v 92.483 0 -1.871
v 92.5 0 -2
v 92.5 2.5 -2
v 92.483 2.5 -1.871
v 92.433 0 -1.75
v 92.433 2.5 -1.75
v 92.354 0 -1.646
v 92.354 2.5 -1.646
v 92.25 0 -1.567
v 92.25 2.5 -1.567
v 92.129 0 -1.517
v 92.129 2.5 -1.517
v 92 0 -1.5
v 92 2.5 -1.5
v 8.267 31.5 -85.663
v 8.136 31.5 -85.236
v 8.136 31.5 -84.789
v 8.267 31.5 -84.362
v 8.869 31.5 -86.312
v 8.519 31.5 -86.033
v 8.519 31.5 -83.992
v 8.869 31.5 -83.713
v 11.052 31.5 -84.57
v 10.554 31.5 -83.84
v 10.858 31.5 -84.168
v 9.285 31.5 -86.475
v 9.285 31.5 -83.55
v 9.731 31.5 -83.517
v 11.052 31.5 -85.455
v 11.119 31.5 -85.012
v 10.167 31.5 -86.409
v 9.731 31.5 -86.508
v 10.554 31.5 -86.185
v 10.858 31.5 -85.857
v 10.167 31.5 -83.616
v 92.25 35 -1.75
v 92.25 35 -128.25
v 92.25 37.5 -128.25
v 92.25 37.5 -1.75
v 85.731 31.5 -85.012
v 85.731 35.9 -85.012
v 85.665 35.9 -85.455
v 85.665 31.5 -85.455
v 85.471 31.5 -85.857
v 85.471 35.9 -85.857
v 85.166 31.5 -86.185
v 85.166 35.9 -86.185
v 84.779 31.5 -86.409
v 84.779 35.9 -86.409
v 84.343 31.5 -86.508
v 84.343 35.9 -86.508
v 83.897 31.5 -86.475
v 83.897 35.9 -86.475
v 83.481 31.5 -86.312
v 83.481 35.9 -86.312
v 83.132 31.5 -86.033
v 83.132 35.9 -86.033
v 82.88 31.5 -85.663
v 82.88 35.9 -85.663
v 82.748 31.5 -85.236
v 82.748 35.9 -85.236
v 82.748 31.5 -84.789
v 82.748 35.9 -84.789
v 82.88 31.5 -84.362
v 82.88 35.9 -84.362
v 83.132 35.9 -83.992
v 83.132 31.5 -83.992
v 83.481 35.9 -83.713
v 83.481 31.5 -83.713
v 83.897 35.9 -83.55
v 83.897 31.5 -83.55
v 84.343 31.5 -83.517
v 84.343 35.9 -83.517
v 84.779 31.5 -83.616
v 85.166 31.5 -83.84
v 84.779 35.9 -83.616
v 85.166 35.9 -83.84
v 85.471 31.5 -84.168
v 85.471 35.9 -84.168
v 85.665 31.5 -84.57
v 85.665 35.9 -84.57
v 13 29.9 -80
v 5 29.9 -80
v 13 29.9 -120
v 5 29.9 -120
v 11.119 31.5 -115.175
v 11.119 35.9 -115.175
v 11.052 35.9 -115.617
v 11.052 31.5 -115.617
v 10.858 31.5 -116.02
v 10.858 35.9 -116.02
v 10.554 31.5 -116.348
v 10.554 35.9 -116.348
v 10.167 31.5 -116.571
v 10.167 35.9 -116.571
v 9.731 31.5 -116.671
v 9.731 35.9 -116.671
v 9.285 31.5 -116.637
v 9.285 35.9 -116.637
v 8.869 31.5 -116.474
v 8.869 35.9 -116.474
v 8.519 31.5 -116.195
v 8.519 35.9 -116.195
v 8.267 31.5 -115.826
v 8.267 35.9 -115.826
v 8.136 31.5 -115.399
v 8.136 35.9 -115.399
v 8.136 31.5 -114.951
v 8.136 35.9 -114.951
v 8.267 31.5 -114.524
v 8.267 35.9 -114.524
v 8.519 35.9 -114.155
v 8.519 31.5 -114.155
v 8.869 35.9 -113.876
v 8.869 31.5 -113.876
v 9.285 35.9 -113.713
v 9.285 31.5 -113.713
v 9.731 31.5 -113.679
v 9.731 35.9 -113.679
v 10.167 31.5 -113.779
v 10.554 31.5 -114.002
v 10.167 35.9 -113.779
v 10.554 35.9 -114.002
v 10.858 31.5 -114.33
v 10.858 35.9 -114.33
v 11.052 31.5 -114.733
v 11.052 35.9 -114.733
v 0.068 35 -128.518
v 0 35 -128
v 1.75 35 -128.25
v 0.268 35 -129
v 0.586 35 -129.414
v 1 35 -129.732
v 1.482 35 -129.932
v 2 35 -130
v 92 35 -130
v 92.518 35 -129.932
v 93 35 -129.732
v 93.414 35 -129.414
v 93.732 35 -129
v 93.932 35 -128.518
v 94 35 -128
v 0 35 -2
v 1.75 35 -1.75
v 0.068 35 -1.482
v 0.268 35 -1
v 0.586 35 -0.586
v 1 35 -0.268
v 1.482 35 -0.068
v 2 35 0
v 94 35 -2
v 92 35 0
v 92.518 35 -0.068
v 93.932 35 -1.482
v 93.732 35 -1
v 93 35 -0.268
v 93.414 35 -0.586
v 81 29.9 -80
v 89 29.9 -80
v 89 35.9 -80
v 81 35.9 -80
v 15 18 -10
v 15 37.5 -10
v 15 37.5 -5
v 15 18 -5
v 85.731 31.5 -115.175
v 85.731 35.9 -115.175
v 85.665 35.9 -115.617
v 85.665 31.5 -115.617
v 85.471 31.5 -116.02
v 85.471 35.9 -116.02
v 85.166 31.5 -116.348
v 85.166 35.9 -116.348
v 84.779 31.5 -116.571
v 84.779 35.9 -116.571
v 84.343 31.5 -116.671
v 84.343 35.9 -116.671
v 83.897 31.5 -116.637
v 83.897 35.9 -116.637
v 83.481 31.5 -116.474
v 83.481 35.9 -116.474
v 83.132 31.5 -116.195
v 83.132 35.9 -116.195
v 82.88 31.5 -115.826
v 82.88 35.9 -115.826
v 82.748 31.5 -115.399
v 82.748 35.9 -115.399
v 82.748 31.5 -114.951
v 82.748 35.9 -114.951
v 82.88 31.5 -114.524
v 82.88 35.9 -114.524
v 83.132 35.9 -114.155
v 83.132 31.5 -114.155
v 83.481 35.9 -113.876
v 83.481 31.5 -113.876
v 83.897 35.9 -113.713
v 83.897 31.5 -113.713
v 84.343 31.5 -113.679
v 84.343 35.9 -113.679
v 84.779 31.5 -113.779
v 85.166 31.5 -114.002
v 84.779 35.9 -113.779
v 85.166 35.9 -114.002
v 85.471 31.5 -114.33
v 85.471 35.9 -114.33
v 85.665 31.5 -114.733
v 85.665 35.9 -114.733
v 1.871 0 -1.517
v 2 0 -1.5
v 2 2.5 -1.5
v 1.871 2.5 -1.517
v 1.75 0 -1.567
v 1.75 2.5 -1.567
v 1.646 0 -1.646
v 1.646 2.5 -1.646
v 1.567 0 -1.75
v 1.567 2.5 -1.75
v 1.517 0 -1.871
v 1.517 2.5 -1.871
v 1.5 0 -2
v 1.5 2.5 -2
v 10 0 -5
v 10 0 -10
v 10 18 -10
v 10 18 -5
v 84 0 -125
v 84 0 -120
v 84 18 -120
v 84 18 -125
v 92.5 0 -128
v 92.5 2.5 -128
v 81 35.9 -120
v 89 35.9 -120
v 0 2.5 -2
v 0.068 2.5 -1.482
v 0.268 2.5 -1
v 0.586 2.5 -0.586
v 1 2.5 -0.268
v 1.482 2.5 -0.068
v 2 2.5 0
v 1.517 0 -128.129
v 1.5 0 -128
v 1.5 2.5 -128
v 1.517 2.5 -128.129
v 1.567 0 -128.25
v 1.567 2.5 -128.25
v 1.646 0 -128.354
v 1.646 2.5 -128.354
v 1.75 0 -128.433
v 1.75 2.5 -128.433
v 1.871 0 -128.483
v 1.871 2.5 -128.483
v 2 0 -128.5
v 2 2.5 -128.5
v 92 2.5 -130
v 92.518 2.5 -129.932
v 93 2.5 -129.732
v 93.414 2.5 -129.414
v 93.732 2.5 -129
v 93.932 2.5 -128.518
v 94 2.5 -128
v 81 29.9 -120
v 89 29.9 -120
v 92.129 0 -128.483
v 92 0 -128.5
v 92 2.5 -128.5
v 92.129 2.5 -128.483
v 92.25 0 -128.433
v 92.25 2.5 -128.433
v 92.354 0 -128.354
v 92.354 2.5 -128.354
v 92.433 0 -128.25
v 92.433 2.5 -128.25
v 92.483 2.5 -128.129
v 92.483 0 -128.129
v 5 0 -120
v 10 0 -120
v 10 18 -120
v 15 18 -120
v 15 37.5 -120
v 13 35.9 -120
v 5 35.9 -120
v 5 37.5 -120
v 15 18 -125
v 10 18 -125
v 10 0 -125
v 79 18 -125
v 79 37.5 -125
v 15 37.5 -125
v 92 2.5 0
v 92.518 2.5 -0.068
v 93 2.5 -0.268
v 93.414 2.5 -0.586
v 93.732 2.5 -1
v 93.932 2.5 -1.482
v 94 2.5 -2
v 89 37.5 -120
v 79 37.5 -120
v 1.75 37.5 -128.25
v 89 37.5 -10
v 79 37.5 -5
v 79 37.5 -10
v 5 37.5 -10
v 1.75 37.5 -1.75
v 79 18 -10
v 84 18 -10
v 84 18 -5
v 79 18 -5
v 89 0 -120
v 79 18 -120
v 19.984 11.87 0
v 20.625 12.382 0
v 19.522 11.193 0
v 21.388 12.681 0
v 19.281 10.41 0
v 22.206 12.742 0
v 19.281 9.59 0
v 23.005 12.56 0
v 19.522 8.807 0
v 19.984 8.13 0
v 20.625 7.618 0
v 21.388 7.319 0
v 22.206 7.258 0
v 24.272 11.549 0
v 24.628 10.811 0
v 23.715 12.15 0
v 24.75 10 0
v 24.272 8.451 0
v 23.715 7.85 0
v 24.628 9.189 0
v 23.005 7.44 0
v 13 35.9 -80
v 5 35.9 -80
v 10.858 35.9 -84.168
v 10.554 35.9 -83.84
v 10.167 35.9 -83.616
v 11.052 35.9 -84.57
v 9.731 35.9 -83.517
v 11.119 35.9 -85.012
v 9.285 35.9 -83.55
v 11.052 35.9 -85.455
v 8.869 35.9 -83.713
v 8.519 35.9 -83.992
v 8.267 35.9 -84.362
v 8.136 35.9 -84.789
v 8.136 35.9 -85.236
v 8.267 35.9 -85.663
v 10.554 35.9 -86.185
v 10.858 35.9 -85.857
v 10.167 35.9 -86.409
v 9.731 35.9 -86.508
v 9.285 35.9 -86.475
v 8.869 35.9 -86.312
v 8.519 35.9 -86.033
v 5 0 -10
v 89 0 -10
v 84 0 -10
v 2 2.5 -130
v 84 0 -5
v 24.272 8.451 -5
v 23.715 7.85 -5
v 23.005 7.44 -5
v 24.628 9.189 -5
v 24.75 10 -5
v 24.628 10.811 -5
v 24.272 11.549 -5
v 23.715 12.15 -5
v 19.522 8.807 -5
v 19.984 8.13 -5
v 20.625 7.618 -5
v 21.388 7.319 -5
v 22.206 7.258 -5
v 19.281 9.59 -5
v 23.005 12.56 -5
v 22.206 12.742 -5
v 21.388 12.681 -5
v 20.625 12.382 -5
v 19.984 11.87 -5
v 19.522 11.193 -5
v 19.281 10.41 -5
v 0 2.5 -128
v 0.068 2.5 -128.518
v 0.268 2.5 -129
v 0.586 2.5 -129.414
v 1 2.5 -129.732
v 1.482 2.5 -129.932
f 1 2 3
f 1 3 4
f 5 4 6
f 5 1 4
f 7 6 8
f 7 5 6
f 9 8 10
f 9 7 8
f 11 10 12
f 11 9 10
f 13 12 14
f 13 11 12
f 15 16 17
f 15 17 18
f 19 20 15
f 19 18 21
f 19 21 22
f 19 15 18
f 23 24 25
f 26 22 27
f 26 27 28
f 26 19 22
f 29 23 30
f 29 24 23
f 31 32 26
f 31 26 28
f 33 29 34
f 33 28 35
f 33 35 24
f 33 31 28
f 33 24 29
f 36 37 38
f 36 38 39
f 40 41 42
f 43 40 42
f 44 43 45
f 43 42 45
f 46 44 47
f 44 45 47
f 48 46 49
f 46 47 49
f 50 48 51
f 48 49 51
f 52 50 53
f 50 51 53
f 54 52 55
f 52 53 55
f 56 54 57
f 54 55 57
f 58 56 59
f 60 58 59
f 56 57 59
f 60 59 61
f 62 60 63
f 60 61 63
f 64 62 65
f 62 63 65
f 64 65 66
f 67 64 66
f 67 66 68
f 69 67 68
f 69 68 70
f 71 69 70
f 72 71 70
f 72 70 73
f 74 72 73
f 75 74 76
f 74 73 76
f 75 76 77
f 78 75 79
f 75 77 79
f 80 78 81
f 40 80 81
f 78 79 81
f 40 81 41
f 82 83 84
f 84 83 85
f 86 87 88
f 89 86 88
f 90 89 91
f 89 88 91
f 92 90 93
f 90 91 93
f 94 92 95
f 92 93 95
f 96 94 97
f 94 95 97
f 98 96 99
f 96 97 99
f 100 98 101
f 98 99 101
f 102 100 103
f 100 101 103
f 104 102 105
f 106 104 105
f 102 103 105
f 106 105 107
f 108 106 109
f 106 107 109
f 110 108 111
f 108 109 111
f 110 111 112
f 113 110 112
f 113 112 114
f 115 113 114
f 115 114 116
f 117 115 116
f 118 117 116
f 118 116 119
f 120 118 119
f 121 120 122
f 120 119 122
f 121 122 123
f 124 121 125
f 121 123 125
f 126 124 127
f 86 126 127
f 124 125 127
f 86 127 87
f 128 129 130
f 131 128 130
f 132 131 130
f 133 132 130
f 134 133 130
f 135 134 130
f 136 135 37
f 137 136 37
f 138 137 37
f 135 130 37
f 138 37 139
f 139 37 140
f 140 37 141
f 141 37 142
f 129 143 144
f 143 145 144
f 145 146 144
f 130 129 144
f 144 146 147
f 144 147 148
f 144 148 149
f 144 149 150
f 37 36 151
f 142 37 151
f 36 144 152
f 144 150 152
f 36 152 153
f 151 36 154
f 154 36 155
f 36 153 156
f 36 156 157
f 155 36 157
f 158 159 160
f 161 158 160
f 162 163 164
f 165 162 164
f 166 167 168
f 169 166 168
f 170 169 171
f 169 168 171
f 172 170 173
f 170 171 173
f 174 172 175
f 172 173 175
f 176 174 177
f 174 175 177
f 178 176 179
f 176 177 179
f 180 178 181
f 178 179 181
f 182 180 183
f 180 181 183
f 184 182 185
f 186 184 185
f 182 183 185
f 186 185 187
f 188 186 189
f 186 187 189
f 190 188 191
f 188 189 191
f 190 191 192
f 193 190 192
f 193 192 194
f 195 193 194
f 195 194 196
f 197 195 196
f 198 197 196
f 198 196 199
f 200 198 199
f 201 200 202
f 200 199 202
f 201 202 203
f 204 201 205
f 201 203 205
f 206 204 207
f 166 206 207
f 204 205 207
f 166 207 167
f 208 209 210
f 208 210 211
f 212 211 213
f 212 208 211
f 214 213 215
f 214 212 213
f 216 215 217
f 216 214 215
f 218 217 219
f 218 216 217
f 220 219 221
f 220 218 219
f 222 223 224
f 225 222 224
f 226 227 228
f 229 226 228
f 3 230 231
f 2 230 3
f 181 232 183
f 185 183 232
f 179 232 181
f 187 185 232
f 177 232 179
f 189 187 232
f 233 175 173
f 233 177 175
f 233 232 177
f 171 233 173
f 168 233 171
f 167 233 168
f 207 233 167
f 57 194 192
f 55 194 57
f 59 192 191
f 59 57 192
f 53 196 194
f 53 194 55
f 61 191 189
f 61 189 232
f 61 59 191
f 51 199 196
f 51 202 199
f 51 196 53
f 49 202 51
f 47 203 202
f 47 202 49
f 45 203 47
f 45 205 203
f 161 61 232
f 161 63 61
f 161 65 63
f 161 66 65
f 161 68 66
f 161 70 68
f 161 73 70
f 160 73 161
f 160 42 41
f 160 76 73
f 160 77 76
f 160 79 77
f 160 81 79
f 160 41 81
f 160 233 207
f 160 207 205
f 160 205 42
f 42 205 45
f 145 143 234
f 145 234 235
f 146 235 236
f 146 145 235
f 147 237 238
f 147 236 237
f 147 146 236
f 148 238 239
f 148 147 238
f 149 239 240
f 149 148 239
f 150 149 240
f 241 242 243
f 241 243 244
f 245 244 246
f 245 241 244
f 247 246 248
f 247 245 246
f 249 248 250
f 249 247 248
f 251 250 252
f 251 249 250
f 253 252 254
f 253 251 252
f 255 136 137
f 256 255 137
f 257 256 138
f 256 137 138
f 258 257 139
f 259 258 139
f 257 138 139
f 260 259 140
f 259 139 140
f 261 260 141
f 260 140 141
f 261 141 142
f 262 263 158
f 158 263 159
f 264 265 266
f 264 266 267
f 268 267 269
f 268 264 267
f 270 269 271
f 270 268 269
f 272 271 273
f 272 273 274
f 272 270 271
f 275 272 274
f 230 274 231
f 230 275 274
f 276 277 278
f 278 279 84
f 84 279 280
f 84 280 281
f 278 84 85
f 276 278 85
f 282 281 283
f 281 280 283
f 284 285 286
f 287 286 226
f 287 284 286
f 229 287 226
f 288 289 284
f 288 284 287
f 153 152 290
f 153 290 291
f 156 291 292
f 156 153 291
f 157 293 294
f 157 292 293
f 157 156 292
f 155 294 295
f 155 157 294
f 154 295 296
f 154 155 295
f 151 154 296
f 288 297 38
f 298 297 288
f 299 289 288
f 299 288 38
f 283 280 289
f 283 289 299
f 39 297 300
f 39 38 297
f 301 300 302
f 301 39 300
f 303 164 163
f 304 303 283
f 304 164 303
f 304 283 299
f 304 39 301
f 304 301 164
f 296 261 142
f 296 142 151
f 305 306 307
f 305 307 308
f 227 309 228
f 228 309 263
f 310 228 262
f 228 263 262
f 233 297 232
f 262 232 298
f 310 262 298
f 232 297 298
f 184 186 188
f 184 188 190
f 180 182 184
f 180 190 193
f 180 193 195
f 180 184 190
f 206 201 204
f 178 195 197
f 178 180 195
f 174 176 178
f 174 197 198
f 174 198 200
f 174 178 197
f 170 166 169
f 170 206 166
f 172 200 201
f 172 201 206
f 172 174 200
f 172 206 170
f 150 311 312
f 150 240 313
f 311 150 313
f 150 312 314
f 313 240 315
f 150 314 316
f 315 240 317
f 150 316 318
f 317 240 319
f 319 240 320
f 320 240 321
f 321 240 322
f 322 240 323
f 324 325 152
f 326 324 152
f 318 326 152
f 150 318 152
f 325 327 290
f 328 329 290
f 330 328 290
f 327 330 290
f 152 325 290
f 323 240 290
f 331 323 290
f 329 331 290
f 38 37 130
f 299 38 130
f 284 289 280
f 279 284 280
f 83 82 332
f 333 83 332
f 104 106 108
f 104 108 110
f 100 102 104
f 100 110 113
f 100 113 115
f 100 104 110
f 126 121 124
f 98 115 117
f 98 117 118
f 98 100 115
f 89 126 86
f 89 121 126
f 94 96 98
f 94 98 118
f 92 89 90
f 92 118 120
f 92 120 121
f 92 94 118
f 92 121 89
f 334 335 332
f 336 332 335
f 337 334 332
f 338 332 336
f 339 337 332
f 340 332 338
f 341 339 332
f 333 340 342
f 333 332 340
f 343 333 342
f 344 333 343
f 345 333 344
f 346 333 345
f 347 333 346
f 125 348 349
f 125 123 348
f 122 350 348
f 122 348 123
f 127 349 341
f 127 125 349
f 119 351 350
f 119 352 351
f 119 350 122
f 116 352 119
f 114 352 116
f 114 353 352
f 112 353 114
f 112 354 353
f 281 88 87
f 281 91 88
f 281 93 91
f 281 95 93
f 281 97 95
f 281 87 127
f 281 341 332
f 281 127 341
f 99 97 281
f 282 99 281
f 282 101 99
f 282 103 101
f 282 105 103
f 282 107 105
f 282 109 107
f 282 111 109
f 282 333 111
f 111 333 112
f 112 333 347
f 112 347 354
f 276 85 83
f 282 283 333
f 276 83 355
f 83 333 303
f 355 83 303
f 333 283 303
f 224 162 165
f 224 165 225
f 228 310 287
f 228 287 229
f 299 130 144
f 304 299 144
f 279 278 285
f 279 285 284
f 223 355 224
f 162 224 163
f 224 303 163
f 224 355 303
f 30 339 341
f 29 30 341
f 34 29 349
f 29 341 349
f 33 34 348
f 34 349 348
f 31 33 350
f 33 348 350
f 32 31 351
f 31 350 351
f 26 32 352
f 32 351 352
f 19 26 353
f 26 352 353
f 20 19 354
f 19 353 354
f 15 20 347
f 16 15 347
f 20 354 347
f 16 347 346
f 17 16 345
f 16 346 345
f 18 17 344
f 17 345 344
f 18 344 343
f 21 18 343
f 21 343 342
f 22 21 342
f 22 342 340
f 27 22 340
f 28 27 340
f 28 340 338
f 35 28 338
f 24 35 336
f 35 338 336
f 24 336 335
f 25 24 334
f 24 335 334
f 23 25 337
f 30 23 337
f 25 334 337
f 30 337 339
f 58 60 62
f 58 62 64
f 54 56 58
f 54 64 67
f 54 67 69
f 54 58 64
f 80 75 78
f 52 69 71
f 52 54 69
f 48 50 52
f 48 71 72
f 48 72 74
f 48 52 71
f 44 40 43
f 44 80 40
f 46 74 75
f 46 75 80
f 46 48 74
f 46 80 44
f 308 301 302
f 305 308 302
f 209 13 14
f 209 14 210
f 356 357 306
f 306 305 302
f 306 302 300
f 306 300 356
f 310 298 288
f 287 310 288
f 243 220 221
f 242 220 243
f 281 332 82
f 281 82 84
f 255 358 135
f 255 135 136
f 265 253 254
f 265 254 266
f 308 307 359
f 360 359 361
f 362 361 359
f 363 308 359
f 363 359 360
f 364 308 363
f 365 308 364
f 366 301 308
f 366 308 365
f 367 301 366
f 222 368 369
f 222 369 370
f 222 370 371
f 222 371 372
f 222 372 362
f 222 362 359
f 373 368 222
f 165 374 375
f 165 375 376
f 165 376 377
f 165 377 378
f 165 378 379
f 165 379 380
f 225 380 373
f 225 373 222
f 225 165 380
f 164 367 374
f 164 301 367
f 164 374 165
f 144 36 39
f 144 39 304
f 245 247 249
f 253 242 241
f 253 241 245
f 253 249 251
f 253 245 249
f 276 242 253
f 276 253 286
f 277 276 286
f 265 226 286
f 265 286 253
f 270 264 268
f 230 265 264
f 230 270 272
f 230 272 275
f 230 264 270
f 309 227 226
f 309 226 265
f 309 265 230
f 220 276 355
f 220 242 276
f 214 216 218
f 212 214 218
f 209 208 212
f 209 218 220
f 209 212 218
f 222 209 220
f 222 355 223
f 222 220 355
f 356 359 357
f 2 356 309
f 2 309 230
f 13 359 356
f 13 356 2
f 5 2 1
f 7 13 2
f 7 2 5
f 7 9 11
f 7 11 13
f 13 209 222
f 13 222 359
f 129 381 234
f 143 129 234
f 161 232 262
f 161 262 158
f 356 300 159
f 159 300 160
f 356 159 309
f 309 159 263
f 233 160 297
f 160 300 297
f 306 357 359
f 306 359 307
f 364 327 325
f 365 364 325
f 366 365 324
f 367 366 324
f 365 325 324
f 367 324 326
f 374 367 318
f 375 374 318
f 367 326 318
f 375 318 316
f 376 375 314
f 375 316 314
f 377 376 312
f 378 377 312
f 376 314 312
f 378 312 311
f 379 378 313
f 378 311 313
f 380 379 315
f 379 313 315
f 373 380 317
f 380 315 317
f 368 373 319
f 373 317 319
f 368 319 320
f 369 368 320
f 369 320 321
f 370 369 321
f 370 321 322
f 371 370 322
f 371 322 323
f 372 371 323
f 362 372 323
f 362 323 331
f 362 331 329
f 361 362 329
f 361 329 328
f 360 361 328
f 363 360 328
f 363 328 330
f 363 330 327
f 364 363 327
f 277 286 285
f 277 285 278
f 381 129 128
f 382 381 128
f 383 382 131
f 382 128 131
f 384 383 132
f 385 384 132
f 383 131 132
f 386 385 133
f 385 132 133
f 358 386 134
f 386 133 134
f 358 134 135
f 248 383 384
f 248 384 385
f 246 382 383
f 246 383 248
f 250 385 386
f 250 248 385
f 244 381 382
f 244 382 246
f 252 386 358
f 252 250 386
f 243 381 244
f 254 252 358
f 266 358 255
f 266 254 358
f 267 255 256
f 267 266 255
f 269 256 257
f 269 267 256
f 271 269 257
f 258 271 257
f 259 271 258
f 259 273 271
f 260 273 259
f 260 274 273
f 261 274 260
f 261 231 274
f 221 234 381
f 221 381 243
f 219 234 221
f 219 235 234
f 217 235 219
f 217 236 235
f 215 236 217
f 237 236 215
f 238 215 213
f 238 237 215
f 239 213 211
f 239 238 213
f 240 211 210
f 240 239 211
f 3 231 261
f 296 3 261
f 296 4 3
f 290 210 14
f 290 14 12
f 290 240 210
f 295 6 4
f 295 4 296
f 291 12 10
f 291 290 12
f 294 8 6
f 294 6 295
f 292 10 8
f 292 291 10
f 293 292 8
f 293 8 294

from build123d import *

# Parameters (mm, degrees)
SKETCH1_W                      = 94
SKETCH1_H                      = 130
BOSS_EXTRUDE1_DEPTH            = 35
SKETCH2_W                      = 90.5
SKETCH2_H                      = 126.5
BOSS_EXTRUDE2_DEPTH            = 2.5
CUT_EXTRUDE1_DEPTH             = 38.5
SKETCH4_W                      = 5
SKETCH4_H                      = 18
CUT_EXTRUDE2_DEPTH             = 5
SKETCH9_W                      = 5
SKETCH9_H                      = 18
CUT_EXTRUDE6_DEPTH             = 5
SKETCH11_W                     = 5
SKETCH11_H                     = 5
CUT_EXTRUDE8_DEPTH             = 18
SKETCH12_W                     = 5
SKETCH12_H                     = 18
CUT_EXTRUDE9_DEPTH             = 5
F_5_5_5_5_DIAMETER_HOLE1_D     = 5.5
F_5_5_5_5_DIAMETER_HOLE1_DEPTH = 5
FILLET1_R                      = 2
CUT_EXTRUDE10_DEPTH            = 2.5
SKETCH17_W                     = 40
SKETCH17_H                     = 6
BOSS_EXTRUDE3_DEPTH            = 8
SKETCH18_W                     = 40
SKETCH18_H                     = 6
BOSS_EXTRUDE4_DEPTH            = 8
SKETCH23_R                     = 1.5
CUT_EXTRUDE11_DEPTH            = 4.4


with BuildPart() as part:
    # Sketch1 → Boss-Extrude1 (new body)
    with BuildSketch(Plane.XZ):
        with Locations((47, -65)):
            Rectangle(SKETCH1_W, SKETCH1_H)
    extrude(amount=-BOSS_EXTRUDE1_DEPTH)

    # Sketch2 → Boss-Extrude2 (add)
    with BuildSketch(Plane(origin=(0, 35, 0), x_dir=(-1, 0, 0), z_dir=(0, 1, 0))):
        with Locations((-47, -65)):
            Rectangle(SKETCH2_W, SKETCH2_H)
    extrude(amount=BOSS_EXTRUDE2_DEPTH)

    # Sketch3 → Cut-Extrude1 (cut, through all)
    with BuildSketch(Plane(origin=(0, 37.5, 0), x_dir=(-1, 0, 0), z_dir=(0, 1, 0))):
        Polygon((-83, -120), (-79, -120), (-79, -125), (-15, -125), (-15, -120), (-5, -120), (-5, -10), (-15, -10), (-15, -5), (-79, -5), (-79, -10), (-89, -10), (-89, -96), (-89, -120), align=None)
    extrude(amount=-CUT_EXTRUDE1_DEPTH, mode=Mode.SUBTRACT)

    # Sketch4 → Cut-Extrude2 (cut)
    with BuildSketch(Plane(origin=(0, 0, -10), x_dir=(-1, 0, 0), z_dir=(0, 0, -1))):
        with Locations((-12.5, 9)):
            Rectangle(SKETCH4_W, SKETCH4_H)
    extrude(amount=-CUT_EXTRUDE2_DEPTH, mode=Mode.SUBTRACT)

    # Sketch9 → Cut-Extrude6 (cut)
    with BuildSketch(Plane(origin=(0, 0, -10), x_dir=(-1, 0, 0), z_dir=(0, 0, -1))):
        with Locations((-81.5, 9)):
            Rectangle(SKETCH9_W, SKETCH9_H)
    extrude(amount=-CUT_EXTRUDE6_DEPTH, mode=Mode.SUBTRACT)

    # Sketch11 → Cut-Extrude8 (cut)
    with BuildSketch(Plane.XZ):
        with Locations((12.5, -122.5)):
            Rectangle(SKETCH11_W, SKETCH11_H)
    extrude(amount=-CUT_EXTRUDE8_DEPTH, mode=Mode.SUBTRACT)

    # Sketch12 → Cut-Extrude9 (cut)
    with BuildSketch(Plane.XY.offset(-120)):
        with Locations((81.5, 9)):
            Rectangle(SKETCH12_W, SKETCH12_H)
    extrude(amount=-CUT_EXTRUDE9_DEPTH, mode=Mode.SUBTRACT)

    # Ø5.5 (5.5) Diameter Hole1
    with Locations(Plane(origin=(0, 0, -5), x_dir=(-1, 0, 0), z_dir=(0, 0, -1))):
        with Locations((-22, 10)):
            Hole(F_5_5_5_5_DIAMETER_HOLE1_D / 2, depth=F_5_5_5_5_DIAMETER_HOLE1_DEPTH)

    # Fillet1
    fillet1_edges = [part.edges().sort_by_distance(p)[0] for p in [
        (94, 17.5, -130),
        (0, 17.5, -130),
        (0, 17.5, 0),
        (94, 17.5, 0),
    ]]
    fillet(fillet1_edges, radius=FILLET1_R)

    # Sketch16 → Cut-Extrude10 (cut)
    with BuildSketch(Plane.XZ):
        with BuildLine():
            Line((0, -2), (0, -128))
            ThreePointArc((0, -128), (0.585786438, -129.414213562), (2, -130))
            Line((2, -130), (92, -130))
            ThreePointArc((92, -130), (93.414213562, -129.414213562), (94, -128))
            Line((94, -128), (94, -2))
            ThreePointArc((94, -2), (93.414213562, -0.585786438), (92, 0))
            Line((92, 0), (2, 0))
            ThreePointArc((2, 0), (0.585786438, -0.585786438), (0, -2))
        make_face()
        with BuildLine():
            Line((1.5, -2), (1.5, -128))
            ThreePointArc((1.5, -128), (1.646446609, -128.353553391), (2, -128.5))
            Line((2, -128.5), (92, -128.5))
            ThreePointArc((92, -128.5), (92.353553391, -128.353553391), (92.5, -128))
            Line((92.5, -128), (92.5, -2))
            ThreePointArc((92.5, -2), (92.353553391, -1.646446609), (92, -1.5))
            Line((92, -1.5), (2, -1.5))
            ThreePointArc((2, -1.5), (1.646446609, -1.646446609), (1.5, -2))
        make_face(mode=Mode.SUBTRACT)
    extrude(amount=-CUT_EXTRUDE10_DEPTH, mode=Mode.SUBTRACT)

    # Sketch17 → Boss-Extrude3 (add)
    with BuildSketch(Plane(origin=(5, 0, 0), x_dir=(0, 0, -1), z_dir=(1, 0, 0))):
        with Locations((100, 32.9)):
            Rectangle(SKETCH17_W, SKETCH17_H)
    extrude(amount=BOSS_EXTRUDE3_DEPTH)

    # Sketch18 → Boss-Extrude4 (add)
    with BuildSketch(Plane.ZY.offset(-89)):
        with Locations((-100, 32.9)):
            Rectangle(SKETCH18_W, SKETCH18_H)
    extrude(amount=BOSS_EXTRUDE4_DEPTH)

    # Sketch23 → Cut-Extrude11 (cut)
    with BuildSketch(Plane(origin=(0, 35.9, 0), x_dir=(1, 0, 0), z_dir=(0, 1, 0))):
        with Locations((9.61875, 115.175)):
            Circle(SKETCH23_R)
        with Locations((9.61875, 85.0125)):
            Circle(SKETCH23_R)
        with Locations((84.23125, 115.175)):
            Circle(SKETCH23_R)
        with Locations((84.23125, 85.0125)):
            Circle(SKETCH23_R)
    extrude(amount=-CUT_EXTRUDE11_DEPTH, mode=Mode.SUBTRACT)


solid = part.part
